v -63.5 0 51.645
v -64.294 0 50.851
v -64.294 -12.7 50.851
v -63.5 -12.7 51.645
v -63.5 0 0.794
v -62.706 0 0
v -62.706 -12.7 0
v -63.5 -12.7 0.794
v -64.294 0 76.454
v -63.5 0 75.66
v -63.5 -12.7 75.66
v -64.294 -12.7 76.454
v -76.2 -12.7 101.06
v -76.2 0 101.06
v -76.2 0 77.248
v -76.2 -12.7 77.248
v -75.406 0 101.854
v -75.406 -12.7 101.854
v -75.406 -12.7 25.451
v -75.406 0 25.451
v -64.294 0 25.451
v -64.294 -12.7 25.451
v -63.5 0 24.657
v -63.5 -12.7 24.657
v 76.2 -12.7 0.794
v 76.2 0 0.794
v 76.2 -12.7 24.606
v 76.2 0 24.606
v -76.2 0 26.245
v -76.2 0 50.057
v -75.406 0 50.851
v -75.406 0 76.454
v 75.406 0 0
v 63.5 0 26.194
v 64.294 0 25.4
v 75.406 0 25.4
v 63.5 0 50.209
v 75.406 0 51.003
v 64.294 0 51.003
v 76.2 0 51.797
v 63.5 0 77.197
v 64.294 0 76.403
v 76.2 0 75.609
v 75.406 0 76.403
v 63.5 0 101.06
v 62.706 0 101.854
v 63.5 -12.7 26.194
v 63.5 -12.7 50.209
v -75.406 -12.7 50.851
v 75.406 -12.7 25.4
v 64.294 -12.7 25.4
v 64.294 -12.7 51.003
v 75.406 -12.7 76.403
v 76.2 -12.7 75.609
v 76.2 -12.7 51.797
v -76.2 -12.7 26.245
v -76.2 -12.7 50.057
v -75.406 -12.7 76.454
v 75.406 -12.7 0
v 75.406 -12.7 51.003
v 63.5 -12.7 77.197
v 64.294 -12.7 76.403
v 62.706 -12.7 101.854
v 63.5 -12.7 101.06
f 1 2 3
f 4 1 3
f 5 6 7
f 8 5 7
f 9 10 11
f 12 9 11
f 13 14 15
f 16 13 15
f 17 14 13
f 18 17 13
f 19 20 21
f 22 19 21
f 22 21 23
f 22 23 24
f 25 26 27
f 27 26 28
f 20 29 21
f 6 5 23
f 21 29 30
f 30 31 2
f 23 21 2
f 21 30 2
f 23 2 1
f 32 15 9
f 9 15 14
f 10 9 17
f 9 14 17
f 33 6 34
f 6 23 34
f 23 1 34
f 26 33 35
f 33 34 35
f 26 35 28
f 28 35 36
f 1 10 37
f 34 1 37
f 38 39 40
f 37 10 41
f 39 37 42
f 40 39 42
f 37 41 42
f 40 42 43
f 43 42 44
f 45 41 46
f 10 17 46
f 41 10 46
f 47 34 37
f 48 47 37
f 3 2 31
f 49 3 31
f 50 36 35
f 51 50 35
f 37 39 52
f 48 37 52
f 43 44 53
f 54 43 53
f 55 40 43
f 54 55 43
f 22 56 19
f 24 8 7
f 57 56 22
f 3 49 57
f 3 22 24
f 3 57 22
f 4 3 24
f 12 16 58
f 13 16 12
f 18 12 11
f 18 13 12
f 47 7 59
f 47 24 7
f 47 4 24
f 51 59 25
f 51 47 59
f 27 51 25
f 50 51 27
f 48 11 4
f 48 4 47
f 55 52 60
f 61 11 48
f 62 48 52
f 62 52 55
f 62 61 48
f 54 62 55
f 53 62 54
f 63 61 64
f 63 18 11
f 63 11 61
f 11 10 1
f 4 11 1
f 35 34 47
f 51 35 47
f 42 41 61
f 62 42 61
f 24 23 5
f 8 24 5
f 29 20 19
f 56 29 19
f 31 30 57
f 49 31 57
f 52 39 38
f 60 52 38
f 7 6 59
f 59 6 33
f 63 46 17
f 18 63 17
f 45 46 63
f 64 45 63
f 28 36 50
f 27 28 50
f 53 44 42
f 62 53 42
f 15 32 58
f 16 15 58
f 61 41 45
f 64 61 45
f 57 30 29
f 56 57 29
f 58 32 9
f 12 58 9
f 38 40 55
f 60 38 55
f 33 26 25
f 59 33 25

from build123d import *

# Parameters (mm, degrees)
F1_DEPTH = 12.7
F2_SIZE  = 0.79375


# Not quite as in the source:
# - a feature names something its author has since deleted; it is built from what else it names


with BuildPart() as f1:
    # F0 (on Front) → F1 (new body)
    with BuildSketch(Plane.XZ):
        Polygon((-63.5, 25.4508), (-63.5, 0), (76.2, 0), (76.2, 25.4), (63.5, 25.4), (63.5, 51.0032), (76.2, 51.0032), (76.2, 76.4032), (63.5, 76.4032), (63.5, 101.854), (-76.2, 101.854), (-76.2, 76.454), (-63.5, 76.454), (-63.5, 50.8508), (-76.2, 50.8508), (-76.2, 25.4508), align=None)
    extrude(amount=F1_DEPTH)

    # F2
    f2_edges = [f1.edges().sort_by_distance(p)[0] for p in [
        (-63.5, -6.35, 76.454),
        (-63.5, -6.35, 50.8508),
        (-63.5, -6.35, 25.4508),
        (-63.5, -6.35, 0),
        (63.5, -6.35, 101.854),
        (76.2, -6.35, 76.4032),
        (63.5, -6.35, 76.4032),
        (63.5, -6.35, 25.4),
        (76.2, -6.35, 25.4),
        (76.2, -6.35, 51.0032),
        (63.5, -6.35, 51.0032),
        (-76.2, -6.35, 50.8508),
        (-76.2, -6.35, 25.4508),
        (76.2, -6.35, 0),
        (-76.2, -6.35, 101.854),
        (-76.2, -6.35, 76.454),
    ]]
    chamfer(f2_edges, length=F2_SIZE)


solid = f1.part
